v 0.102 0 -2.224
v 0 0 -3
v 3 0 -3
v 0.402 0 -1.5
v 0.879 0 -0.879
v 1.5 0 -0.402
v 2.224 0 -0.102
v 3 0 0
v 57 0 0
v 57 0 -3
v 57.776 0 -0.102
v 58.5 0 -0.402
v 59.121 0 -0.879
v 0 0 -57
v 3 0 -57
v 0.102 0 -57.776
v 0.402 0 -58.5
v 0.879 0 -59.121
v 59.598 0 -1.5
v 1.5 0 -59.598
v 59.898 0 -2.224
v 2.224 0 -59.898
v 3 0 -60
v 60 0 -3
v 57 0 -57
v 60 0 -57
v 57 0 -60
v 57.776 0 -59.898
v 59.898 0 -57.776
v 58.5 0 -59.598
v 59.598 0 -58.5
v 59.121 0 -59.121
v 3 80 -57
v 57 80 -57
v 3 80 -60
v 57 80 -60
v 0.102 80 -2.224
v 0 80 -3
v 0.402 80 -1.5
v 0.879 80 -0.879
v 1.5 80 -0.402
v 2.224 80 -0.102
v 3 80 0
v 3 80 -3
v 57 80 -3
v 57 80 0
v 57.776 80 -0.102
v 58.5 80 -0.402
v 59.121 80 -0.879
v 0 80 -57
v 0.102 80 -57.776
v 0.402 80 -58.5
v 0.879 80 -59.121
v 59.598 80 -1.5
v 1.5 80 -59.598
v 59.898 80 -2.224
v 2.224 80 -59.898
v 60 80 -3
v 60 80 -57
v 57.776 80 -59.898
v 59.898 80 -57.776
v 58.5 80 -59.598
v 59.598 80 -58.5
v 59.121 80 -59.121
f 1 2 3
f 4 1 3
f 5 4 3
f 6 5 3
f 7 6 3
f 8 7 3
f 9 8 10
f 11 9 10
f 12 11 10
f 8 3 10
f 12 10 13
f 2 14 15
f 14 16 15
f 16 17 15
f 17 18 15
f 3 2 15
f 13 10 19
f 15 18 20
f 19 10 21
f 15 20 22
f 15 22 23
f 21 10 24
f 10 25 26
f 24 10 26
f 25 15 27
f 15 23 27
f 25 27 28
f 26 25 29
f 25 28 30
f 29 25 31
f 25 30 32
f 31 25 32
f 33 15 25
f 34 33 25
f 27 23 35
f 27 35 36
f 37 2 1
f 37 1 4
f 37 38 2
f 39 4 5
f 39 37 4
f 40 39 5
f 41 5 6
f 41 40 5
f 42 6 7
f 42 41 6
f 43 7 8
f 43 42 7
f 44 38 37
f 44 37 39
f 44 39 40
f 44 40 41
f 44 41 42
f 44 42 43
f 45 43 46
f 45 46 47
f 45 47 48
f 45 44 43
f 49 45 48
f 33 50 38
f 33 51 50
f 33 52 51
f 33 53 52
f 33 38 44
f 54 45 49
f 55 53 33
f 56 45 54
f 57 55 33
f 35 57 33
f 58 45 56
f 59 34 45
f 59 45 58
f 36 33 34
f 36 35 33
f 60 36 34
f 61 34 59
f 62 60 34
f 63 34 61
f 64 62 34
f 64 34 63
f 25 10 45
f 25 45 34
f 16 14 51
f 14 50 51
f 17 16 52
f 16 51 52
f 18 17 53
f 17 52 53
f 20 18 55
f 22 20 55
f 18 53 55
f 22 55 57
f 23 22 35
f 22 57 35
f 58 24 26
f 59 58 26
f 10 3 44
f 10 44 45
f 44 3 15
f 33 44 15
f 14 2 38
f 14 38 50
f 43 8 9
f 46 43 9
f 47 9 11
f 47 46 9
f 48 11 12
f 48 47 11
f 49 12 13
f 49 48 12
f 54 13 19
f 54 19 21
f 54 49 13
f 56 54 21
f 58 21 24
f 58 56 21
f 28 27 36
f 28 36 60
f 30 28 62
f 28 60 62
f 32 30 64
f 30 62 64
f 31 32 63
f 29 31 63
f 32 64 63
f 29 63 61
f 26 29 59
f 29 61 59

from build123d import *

# Parameters (mm, degrees)
SKETCH1_W           = 60
SKETCH1_H           = 60
SKETCH1_W_2         = 54
SKETCH1_H_2         = 54
BOSS_EXTRUDE1_DEPTH = 80
FILLET2_R           = 3


with BuildPart() as part:
    # Sketch1 → Boss-Extrude1 (new body)
    with BuildSketch(Plane(origin=(0, 0, 0), x_dir=(1, 0, 0), z_dir=(0, 1, 0))):
        with Locations((30, 30)):
            Rectangle(SKETCH1_W, SKETCH1_H)
        with Locations((30, 30)):
            Rectangle(SKETCH1_W_2, SKETCH1_H_2, mode=Mode.SUBTRACT)
    extrude(amount=BOSS_EXTRUDE1_DEPTH)

    # Fillet2
    fillet2_edges = [part.edges().sort_by_distance(p)[0] for p in [
        (0, 40, -60),
        (60, 40, -60),
        (60, 40, 0),
        (0, 40, 0),
    ]]
    fillet(fillet2_edges, radius=FILLET2_R)


solid = part.part
